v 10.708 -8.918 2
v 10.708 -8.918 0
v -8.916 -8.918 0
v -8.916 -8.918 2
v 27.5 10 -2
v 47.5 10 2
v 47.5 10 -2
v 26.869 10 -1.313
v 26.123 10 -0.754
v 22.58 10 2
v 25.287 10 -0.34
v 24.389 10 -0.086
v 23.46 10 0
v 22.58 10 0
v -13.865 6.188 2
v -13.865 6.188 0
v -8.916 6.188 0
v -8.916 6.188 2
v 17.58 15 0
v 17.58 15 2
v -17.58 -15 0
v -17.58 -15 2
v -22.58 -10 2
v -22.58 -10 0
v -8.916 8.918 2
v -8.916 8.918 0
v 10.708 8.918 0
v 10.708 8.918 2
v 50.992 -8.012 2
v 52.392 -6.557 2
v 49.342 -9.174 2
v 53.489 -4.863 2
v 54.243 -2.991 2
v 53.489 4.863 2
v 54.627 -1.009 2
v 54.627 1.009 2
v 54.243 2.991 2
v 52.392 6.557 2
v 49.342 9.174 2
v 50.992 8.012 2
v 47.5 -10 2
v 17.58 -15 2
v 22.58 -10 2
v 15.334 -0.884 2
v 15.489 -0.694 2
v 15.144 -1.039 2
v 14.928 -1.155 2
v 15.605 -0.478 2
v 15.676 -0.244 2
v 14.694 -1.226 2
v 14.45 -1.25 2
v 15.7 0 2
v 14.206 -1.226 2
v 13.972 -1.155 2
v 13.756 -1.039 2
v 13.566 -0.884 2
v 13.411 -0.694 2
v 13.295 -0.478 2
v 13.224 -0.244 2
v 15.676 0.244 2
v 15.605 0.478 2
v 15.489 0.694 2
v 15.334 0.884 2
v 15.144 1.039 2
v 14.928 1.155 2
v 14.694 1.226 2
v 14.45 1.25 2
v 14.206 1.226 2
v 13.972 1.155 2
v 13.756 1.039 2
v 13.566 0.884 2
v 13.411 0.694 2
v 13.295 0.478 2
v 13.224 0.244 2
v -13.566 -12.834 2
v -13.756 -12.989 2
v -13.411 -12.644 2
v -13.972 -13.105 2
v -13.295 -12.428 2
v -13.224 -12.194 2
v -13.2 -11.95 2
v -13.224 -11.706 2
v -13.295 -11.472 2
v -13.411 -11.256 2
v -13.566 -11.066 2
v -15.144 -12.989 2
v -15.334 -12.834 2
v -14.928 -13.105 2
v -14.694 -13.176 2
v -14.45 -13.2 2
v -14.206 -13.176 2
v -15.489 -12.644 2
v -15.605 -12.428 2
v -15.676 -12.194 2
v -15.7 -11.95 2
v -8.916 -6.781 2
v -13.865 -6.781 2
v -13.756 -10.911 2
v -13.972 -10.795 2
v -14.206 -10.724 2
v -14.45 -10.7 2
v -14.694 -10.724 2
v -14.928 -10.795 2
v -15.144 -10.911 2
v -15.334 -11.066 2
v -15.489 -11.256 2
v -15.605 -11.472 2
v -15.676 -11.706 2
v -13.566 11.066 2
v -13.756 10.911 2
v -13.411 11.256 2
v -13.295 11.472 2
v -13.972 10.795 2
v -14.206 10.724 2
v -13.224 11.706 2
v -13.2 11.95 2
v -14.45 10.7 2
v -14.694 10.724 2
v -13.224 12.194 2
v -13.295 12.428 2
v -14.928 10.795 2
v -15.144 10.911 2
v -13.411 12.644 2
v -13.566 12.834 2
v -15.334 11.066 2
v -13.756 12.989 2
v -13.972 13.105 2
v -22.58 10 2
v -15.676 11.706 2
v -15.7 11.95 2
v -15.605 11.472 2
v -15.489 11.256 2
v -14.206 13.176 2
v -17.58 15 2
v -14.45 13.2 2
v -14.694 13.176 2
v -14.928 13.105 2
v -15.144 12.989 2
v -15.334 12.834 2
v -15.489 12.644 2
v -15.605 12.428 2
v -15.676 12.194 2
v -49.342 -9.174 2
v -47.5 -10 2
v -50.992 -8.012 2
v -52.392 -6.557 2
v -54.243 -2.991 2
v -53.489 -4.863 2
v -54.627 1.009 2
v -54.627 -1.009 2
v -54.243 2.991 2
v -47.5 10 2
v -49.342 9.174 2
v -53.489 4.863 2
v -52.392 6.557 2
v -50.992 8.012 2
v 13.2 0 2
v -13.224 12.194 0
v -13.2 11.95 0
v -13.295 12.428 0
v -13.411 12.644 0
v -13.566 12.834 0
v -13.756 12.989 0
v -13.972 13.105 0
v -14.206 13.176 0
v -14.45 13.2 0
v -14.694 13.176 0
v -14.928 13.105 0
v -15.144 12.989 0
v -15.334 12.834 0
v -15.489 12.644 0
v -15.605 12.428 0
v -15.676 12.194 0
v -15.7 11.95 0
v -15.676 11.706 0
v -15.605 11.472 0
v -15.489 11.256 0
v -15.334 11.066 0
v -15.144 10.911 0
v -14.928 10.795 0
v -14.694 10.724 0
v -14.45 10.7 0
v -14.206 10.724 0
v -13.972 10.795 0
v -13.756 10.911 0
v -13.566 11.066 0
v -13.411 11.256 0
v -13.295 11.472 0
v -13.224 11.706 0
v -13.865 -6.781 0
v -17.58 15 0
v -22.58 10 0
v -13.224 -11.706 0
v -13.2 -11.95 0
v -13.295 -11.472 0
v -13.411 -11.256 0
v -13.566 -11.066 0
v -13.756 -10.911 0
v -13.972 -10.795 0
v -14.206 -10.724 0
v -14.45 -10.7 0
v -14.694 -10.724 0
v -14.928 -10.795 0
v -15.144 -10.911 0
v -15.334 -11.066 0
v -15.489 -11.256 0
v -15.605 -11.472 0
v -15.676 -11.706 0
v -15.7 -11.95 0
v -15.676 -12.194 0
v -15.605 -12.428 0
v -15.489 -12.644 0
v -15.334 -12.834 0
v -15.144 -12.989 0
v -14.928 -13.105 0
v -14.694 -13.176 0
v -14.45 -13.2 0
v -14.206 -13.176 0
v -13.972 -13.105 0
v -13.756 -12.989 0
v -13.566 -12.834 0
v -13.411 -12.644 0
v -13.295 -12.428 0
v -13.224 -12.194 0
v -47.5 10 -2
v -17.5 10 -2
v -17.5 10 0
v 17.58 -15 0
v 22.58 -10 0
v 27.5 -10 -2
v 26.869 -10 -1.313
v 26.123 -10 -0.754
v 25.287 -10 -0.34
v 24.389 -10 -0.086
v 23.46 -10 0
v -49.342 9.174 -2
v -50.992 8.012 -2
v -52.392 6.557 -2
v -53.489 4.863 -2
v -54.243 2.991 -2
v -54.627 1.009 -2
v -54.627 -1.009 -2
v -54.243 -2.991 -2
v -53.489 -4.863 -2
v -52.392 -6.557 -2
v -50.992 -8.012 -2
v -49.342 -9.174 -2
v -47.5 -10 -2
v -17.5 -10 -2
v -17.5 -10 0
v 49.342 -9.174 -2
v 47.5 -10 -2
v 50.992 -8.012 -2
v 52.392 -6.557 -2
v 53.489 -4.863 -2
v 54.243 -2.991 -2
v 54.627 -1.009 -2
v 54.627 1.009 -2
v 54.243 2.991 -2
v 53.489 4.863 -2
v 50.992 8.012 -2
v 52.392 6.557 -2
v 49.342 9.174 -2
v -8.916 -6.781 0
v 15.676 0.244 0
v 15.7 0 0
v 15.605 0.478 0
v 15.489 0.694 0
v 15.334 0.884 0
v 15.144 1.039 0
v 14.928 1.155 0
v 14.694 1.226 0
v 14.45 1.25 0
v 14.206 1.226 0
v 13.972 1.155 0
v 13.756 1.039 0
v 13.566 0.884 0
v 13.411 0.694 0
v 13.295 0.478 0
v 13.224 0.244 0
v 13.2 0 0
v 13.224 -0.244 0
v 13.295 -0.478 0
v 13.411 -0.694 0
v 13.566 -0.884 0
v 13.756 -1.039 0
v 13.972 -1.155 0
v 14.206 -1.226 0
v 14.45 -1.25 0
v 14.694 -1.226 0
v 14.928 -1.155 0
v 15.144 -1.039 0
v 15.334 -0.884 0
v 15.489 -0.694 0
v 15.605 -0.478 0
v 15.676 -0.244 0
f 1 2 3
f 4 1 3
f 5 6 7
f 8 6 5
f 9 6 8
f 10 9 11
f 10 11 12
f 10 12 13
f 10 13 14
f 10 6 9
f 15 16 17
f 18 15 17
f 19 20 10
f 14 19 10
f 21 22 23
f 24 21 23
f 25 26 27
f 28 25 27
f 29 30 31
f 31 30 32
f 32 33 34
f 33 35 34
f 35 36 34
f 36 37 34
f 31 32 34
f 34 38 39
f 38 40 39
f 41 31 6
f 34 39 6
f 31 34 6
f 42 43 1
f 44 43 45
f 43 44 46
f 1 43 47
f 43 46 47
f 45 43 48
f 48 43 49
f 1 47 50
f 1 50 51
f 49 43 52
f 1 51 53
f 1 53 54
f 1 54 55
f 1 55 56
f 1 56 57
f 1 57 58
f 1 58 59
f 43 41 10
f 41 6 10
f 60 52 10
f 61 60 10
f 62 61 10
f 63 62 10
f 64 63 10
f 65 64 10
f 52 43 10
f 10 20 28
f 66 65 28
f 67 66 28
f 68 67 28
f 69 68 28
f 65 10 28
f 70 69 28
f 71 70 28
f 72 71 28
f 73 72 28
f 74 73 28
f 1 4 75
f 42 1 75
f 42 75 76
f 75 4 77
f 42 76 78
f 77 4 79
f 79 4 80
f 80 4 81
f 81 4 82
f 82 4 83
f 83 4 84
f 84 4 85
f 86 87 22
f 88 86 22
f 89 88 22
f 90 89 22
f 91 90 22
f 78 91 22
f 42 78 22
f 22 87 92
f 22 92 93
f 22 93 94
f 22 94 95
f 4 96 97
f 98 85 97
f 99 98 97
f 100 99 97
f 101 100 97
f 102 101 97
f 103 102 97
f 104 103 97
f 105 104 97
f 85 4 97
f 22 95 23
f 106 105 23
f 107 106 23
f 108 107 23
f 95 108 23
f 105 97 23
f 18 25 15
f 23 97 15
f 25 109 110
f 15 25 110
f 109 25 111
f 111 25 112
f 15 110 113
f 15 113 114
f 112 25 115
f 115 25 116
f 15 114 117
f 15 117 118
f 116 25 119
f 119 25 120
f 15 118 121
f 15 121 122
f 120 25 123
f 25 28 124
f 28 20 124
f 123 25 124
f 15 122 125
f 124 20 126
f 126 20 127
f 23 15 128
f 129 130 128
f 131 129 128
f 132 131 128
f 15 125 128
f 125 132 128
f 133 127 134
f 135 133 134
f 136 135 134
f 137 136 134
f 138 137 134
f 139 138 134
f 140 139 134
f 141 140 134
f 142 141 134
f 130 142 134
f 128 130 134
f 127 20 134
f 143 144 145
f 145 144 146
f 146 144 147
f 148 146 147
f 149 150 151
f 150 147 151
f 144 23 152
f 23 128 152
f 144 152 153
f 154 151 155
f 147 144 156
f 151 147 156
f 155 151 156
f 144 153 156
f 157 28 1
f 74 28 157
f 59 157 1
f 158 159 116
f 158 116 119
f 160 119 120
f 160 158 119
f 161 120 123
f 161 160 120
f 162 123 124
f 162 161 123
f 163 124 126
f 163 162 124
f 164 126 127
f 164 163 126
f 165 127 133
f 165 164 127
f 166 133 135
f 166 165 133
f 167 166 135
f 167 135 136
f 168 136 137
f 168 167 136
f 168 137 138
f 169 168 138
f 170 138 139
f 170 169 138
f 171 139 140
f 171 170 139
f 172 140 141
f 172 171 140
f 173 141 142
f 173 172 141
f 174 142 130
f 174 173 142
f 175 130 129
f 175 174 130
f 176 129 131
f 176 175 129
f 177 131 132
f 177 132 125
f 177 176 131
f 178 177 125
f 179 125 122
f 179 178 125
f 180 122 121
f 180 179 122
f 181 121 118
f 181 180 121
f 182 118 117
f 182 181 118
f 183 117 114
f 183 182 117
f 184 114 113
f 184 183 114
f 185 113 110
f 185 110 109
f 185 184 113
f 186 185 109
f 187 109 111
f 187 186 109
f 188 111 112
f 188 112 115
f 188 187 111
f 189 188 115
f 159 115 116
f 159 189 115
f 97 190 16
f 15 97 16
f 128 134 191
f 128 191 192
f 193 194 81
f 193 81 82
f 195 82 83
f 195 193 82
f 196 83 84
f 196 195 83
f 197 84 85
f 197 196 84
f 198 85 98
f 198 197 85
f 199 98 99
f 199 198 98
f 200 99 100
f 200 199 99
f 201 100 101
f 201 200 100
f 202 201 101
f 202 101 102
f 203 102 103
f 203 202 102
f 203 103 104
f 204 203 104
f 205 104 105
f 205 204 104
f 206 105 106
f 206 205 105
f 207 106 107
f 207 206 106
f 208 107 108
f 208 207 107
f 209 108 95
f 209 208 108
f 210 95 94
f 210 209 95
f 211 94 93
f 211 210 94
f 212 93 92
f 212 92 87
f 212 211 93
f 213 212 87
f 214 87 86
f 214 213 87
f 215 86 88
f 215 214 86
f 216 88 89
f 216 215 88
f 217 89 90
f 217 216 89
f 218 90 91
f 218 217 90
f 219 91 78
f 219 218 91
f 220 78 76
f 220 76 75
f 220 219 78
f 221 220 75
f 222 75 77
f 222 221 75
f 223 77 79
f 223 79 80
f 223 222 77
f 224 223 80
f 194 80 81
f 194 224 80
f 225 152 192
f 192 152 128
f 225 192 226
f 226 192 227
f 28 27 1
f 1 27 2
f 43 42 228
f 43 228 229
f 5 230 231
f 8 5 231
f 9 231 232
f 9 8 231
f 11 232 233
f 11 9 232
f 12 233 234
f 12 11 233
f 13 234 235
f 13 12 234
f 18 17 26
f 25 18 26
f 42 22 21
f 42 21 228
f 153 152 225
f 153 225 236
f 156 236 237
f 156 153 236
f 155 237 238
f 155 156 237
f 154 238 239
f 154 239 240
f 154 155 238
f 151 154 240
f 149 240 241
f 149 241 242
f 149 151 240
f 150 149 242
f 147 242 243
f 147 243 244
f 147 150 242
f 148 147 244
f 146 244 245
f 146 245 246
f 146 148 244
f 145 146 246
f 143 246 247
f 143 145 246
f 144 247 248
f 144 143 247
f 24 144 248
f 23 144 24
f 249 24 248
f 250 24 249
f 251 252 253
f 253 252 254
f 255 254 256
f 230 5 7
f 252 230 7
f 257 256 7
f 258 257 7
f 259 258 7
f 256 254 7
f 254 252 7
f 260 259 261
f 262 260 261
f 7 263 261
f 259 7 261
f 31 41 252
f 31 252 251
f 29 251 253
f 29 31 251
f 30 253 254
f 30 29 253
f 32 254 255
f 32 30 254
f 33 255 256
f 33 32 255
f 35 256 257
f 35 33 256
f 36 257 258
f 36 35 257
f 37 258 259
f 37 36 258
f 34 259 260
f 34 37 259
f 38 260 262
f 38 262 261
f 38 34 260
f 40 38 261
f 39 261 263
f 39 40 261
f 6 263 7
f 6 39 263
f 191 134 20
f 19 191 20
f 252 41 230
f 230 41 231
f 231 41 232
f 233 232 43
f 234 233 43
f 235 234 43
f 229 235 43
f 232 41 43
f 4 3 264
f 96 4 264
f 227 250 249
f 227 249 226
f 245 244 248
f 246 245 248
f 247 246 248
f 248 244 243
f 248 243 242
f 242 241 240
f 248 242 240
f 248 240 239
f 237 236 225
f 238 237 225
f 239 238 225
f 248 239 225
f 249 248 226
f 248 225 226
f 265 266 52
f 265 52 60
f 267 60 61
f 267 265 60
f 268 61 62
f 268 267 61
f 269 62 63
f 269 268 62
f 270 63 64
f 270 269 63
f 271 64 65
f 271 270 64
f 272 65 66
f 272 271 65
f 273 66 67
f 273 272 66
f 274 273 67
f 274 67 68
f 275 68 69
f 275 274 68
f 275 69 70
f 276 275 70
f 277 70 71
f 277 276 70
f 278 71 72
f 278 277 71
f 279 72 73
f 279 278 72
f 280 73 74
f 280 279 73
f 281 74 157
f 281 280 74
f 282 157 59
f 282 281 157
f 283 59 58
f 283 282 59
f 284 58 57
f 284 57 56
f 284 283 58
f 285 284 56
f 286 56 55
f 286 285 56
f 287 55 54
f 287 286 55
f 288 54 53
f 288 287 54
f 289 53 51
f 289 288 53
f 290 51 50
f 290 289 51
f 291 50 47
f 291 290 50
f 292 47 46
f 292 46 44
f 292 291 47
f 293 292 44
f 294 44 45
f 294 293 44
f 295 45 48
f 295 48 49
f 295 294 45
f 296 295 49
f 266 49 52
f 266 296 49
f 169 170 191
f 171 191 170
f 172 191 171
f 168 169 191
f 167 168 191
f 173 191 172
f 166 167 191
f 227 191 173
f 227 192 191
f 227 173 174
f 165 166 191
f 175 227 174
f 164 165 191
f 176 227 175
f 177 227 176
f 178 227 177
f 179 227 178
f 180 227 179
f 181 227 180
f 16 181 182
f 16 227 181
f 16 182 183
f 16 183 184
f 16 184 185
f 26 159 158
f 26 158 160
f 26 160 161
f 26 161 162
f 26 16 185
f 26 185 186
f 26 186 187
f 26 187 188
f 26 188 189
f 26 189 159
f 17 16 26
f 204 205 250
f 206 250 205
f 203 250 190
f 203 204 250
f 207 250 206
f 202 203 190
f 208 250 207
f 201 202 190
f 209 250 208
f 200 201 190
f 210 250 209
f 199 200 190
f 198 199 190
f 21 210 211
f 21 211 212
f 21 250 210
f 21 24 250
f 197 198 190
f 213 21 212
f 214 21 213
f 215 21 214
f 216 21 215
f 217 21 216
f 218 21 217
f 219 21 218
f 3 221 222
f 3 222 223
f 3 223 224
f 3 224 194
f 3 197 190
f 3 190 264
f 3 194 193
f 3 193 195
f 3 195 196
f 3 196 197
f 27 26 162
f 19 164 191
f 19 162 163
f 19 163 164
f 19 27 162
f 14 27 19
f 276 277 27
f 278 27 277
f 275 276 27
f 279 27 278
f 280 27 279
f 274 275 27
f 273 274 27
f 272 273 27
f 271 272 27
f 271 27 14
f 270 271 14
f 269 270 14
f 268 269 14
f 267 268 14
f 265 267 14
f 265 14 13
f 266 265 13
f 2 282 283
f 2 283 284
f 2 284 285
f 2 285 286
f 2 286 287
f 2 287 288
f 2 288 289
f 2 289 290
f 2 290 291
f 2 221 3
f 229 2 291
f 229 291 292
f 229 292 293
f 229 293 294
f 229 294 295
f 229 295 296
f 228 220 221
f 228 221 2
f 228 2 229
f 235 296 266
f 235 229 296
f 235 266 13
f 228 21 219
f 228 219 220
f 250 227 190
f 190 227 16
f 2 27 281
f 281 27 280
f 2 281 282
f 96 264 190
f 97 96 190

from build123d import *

# Parameters (mm, degrees)
F0_W         = 35
F0_H         = 30
F0_R         = 1.25
F1_DEPTH     = 2
F2_W         = 20
F2_H         = 20
F2_W_2       = 30
F2_W_3       = 10
F3_DEPTH     = 4
F4_T4_DEPTH  = 2
F4_T9_DEPTH  = 2
F4_T14_DEPTH = 2
F4_T19_DEPTH = 2
F6_SIZE      = 5.08
F7_SIZE      = 5.08
F9_DEPTH     = 2
F10_T1_DEPTH = 20


# Not quite as in the source:
# - a fillet or chamfer that OpenCascade refuses, or shapes differently, is made with other operations: its cross-section is extruded or revolved along the edge and cut away or added
# - a feature of the source that left no trace in its solid (it failed there, or was rolled back) is left out


with BuildPart() as f1:
    # F0 (on Top) → F1 (new body)
    with BuildSketch(Plane.XY):
        Rectangle(F0_W, F0_H)
        with Locations((-14.45, -11.95)):
            Circle(F0_R, mode=Mode.SUBTRACT)
        Polygon((-8.9161582291, 8.9178942144), (8.9161582291, 8.9178942144), (10.7079278678, 8.9178942144), (10.7079250291, -8.9178942144), (8.9161582291, -8.9178942144), (-8.9161582291, -8.9178942144), (-8.9161582291, -6.7814155482), (-13.8649037108, -6.7814155482), (-13.8649037108, 6.1875791289), (-8.9161582291, 6.1875791289), align=None, mode=Mode.SUBTRACT)
        with Locations((-14.45, 11.95)):
            Circle(F0_R, mode=Mode.SUBTRACT)
        with Locations((14.45, 0)):
            Circle(F0_R, mode=Mode.SUBTRACT)
    extrude(amount=F1_DEPTH)

    # F2 (on face) → F3 (join)
    with BuildSketch(Plane.XY.offset(2)):
        with BuildLine():
            Line((47.5, 10), (47.5, -10))
            ThreePointArc((47.5, -10), (54.6755987692, 0), (47.5, 10))
        make_face()
        with BuildLine():
            ThreePointArc((-47.5, 10), (-54.6755833881, 0), (-47.5, -10))
            Line((-47.5, -10), (-47.5, 10))
        make_face()
        with Locations((37.5, 0)):
            Rectangle(F2_W, F2_H)
        with Locations((-32.5, 0)):
            Rectangle(F2_W_2, F2_H)
        with Locations((22.5, 0)):
            Rectangle(F2_W_3, F2_H)
    extrude(amount=-F3_DEPTH)

    # F4: chamfer of 5.08 on 4 edges, made by hand


with BuildPart() as f4_tool2:
    # F4_s3 → F4_t4 (new body)
    with BuildSketch(Plane.XY.offset(2)):
        Polygon((-17.5, 15.08), (-22.58, 10), (-17.5, 10), align=None)
    extrude(amount=-F4_T4_DEPTH)

    split(bisect_by=Plane.XZ.offset(-15), keep=Keep.TOP)


with BuildPart() as f1_1:
    add(f1.part)

    # F4_t1: union F4_tool2
    add(f4_tool2.part)


with BuildPart() as f4_tool7:
    # F4_s8 → F4_t9 (new body)
    with BuildSketch(Plane.XY.offset(2)):
        Polygon((17.5, -15.08), (22.58, -10), (17.5, -10), align=None)
    extrude(amount=-F4_T9_DEPTH)

    split(bisect_by=Plane.XZ.offset(15), keep=Keep.BOTTOM)


with BuildPart() as f1_2:
    add(f1_1.part)

    # F4_t6: union F4_tool7
    add(f4_tool7.part)


with BuildPart() as f4_tool12:
    # F4_s13 → F4_t14 (new body)
    with BuildSketch(Plane.XY.offset(2)):
        Polygon((17.5, 15.08), (22.58, 10), (17.5, 10), align=None)
    extrude(amount=-F4_T14_DEPTH)

    split(bisect_by=Plane.XZ.offset(-15), keep=Keep.TOP)


with BuildPart() as f1_3:
    add(f1_2.part)

    # F4_t11: union F4_tool12
    add(f4_tool12.part)


with BuildPart() as f4_tool17:
    # F4_s18 → F4_t19 (new body)
    with BuildSketch(Plane.XY.offset(2)):
        Polygon((-17.5, -15.08), (-22.58, -10), (-17.5, -10), align=None)
    extrude(amount=-F4_T19_DEPTH)

    split(bisect_by=Plane.XZ.offset(15), keep=Keep.BOTTOM)


with BuildPart() as f1_4:
    add(f1_3.part)

    # F4_t16: union F4_tool17
    add(f4_tool17.part)

    # F6
    f6_edges = [f1_4.edges().sort_by_distance(p)[0] for p in [
        (17.5, -10, -1),
    ]]
    chamfer(f6_edges, length=F6_SIZE)

    # F7
    f7_edges = [f1_4.edges().sort_by_distance(p)[0] for p in [
        (17.5, 10, -1),
    ]]
    chamfer(f7_edges, length=F7_SIZE)

    # F8 (on face) → F9 (cut)
    with BuildSketch(Plane(origin=(0, 0, -2), x_dir=(1, 0, 0), z_dir=(0, 0, -1))):
        Polygon((27.5, -10), (27.5, 10), (22.58, 10), (17.5, 4.92), (17.5, -4.92), (22.58, -10), align=None)
    extrude(amount=-F9_DEPTH, mode=Mode.SUBTRACT)

    # F10: fillet of radius 5.08 on 1 edges, made by hand

    # F10_s2 → F10_t1 (join)
    with BuildSketch(Plane.XZ.offset(-10)):
        with BuildLine():
            ThreePointArc((27.5, -2), (25.7140835586, -0.5273743839), (23.4601980247, 0))
            Line((23.4601980247, 0), (27.5, 0))
            Line((27.5, 0), (27.5, -2))
        make_face()
    extrude(amount=F10_T1_DEPTH)


solid = f1_4.part
